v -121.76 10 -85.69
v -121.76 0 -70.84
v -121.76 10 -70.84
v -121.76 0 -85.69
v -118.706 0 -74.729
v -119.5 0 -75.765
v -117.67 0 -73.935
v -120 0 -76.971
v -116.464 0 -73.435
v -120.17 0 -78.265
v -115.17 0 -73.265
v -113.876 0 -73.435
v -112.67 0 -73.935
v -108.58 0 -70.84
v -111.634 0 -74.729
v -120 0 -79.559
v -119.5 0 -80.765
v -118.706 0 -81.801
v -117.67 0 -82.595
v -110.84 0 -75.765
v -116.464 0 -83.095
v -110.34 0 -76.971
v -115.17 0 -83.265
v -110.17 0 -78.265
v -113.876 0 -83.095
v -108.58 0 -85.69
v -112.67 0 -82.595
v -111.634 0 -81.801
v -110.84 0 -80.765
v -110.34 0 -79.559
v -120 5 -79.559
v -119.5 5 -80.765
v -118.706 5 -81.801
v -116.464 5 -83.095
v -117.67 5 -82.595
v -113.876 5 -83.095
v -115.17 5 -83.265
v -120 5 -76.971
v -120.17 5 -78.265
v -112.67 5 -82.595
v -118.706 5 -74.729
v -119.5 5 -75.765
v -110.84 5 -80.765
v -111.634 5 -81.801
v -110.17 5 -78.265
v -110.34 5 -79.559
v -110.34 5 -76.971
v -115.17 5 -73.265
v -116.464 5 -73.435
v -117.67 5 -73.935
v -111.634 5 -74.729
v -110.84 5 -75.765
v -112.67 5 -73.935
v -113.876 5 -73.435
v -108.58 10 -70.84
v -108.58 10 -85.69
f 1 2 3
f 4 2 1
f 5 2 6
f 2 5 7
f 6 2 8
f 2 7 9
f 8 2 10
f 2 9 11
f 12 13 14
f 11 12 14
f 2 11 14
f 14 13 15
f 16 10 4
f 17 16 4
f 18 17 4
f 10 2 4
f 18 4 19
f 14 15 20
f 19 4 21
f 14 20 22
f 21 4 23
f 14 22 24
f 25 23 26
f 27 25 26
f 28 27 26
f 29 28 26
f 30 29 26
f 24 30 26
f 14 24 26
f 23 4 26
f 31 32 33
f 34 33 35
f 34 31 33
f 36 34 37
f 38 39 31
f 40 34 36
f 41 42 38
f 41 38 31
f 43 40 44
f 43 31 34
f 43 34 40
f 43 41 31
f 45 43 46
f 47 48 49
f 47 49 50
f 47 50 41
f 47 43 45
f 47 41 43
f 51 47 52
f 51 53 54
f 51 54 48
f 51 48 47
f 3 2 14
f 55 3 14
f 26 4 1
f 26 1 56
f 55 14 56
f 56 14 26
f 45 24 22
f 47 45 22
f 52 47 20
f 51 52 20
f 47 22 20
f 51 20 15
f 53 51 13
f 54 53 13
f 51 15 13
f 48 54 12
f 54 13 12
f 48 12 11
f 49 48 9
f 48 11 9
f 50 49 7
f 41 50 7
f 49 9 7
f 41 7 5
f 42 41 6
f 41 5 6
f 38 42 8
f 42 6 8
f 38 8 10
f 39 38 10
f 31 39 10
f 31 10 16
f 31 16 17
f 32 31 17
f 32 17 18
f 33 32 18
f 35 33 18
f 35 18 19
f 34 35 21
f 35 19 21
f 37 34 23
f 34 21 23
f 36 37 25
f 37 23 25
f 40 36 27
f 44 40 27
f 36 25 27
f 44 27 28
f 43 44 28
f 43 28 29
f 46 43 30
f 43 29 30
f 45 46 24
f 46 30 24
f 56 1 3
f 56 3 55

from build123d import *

# Parameters (mm, degrees)
SKETCH4_W           = 13.18
SKETCH4_H           = 14.85
BOSS_EXTRUDE2_DEPTH = 10
CUT_EXTRUDE1_DEPTH  = 5


with BuildPart() as part:
    # Sketch4 → Boss-Extrude2 (new body)
    with BuildSketch(Plane(origin=(0, 0, 0), x_dir=(1, 0, 0), z_dir=(0, 1, 0))):
        with Locations((-115.17, 78.265)):
            Rectangle(SKETCH4_W, SKETCH4_H)
    extrude(amount=BOSS_EXTRUDE2_DEPTH)

    # Sketch5 → Cut-Extrude1 (cut)
    with BuildSketch(Plane.XZ):
        with BuildLine():
            ThreePointArc((-120.17, -78.265), (-115.17, -83.265), (-110.17, -78.265))
            Line((-110.17, -78.265), (-120.17, -78.265))
        make_face()
        with BuildLine():
            Line((-120.17, -78.265), (-110.17, -78.265))
            ThreePointArc((-110.17, -78.265), (-115.17, -73.265), (-120.17, -78.265))
        make_face()
    extrude(amount=-CUT_EXTRUDE1_DEPTH, mode=Mode.SUBTRACT)


solid = part.part
